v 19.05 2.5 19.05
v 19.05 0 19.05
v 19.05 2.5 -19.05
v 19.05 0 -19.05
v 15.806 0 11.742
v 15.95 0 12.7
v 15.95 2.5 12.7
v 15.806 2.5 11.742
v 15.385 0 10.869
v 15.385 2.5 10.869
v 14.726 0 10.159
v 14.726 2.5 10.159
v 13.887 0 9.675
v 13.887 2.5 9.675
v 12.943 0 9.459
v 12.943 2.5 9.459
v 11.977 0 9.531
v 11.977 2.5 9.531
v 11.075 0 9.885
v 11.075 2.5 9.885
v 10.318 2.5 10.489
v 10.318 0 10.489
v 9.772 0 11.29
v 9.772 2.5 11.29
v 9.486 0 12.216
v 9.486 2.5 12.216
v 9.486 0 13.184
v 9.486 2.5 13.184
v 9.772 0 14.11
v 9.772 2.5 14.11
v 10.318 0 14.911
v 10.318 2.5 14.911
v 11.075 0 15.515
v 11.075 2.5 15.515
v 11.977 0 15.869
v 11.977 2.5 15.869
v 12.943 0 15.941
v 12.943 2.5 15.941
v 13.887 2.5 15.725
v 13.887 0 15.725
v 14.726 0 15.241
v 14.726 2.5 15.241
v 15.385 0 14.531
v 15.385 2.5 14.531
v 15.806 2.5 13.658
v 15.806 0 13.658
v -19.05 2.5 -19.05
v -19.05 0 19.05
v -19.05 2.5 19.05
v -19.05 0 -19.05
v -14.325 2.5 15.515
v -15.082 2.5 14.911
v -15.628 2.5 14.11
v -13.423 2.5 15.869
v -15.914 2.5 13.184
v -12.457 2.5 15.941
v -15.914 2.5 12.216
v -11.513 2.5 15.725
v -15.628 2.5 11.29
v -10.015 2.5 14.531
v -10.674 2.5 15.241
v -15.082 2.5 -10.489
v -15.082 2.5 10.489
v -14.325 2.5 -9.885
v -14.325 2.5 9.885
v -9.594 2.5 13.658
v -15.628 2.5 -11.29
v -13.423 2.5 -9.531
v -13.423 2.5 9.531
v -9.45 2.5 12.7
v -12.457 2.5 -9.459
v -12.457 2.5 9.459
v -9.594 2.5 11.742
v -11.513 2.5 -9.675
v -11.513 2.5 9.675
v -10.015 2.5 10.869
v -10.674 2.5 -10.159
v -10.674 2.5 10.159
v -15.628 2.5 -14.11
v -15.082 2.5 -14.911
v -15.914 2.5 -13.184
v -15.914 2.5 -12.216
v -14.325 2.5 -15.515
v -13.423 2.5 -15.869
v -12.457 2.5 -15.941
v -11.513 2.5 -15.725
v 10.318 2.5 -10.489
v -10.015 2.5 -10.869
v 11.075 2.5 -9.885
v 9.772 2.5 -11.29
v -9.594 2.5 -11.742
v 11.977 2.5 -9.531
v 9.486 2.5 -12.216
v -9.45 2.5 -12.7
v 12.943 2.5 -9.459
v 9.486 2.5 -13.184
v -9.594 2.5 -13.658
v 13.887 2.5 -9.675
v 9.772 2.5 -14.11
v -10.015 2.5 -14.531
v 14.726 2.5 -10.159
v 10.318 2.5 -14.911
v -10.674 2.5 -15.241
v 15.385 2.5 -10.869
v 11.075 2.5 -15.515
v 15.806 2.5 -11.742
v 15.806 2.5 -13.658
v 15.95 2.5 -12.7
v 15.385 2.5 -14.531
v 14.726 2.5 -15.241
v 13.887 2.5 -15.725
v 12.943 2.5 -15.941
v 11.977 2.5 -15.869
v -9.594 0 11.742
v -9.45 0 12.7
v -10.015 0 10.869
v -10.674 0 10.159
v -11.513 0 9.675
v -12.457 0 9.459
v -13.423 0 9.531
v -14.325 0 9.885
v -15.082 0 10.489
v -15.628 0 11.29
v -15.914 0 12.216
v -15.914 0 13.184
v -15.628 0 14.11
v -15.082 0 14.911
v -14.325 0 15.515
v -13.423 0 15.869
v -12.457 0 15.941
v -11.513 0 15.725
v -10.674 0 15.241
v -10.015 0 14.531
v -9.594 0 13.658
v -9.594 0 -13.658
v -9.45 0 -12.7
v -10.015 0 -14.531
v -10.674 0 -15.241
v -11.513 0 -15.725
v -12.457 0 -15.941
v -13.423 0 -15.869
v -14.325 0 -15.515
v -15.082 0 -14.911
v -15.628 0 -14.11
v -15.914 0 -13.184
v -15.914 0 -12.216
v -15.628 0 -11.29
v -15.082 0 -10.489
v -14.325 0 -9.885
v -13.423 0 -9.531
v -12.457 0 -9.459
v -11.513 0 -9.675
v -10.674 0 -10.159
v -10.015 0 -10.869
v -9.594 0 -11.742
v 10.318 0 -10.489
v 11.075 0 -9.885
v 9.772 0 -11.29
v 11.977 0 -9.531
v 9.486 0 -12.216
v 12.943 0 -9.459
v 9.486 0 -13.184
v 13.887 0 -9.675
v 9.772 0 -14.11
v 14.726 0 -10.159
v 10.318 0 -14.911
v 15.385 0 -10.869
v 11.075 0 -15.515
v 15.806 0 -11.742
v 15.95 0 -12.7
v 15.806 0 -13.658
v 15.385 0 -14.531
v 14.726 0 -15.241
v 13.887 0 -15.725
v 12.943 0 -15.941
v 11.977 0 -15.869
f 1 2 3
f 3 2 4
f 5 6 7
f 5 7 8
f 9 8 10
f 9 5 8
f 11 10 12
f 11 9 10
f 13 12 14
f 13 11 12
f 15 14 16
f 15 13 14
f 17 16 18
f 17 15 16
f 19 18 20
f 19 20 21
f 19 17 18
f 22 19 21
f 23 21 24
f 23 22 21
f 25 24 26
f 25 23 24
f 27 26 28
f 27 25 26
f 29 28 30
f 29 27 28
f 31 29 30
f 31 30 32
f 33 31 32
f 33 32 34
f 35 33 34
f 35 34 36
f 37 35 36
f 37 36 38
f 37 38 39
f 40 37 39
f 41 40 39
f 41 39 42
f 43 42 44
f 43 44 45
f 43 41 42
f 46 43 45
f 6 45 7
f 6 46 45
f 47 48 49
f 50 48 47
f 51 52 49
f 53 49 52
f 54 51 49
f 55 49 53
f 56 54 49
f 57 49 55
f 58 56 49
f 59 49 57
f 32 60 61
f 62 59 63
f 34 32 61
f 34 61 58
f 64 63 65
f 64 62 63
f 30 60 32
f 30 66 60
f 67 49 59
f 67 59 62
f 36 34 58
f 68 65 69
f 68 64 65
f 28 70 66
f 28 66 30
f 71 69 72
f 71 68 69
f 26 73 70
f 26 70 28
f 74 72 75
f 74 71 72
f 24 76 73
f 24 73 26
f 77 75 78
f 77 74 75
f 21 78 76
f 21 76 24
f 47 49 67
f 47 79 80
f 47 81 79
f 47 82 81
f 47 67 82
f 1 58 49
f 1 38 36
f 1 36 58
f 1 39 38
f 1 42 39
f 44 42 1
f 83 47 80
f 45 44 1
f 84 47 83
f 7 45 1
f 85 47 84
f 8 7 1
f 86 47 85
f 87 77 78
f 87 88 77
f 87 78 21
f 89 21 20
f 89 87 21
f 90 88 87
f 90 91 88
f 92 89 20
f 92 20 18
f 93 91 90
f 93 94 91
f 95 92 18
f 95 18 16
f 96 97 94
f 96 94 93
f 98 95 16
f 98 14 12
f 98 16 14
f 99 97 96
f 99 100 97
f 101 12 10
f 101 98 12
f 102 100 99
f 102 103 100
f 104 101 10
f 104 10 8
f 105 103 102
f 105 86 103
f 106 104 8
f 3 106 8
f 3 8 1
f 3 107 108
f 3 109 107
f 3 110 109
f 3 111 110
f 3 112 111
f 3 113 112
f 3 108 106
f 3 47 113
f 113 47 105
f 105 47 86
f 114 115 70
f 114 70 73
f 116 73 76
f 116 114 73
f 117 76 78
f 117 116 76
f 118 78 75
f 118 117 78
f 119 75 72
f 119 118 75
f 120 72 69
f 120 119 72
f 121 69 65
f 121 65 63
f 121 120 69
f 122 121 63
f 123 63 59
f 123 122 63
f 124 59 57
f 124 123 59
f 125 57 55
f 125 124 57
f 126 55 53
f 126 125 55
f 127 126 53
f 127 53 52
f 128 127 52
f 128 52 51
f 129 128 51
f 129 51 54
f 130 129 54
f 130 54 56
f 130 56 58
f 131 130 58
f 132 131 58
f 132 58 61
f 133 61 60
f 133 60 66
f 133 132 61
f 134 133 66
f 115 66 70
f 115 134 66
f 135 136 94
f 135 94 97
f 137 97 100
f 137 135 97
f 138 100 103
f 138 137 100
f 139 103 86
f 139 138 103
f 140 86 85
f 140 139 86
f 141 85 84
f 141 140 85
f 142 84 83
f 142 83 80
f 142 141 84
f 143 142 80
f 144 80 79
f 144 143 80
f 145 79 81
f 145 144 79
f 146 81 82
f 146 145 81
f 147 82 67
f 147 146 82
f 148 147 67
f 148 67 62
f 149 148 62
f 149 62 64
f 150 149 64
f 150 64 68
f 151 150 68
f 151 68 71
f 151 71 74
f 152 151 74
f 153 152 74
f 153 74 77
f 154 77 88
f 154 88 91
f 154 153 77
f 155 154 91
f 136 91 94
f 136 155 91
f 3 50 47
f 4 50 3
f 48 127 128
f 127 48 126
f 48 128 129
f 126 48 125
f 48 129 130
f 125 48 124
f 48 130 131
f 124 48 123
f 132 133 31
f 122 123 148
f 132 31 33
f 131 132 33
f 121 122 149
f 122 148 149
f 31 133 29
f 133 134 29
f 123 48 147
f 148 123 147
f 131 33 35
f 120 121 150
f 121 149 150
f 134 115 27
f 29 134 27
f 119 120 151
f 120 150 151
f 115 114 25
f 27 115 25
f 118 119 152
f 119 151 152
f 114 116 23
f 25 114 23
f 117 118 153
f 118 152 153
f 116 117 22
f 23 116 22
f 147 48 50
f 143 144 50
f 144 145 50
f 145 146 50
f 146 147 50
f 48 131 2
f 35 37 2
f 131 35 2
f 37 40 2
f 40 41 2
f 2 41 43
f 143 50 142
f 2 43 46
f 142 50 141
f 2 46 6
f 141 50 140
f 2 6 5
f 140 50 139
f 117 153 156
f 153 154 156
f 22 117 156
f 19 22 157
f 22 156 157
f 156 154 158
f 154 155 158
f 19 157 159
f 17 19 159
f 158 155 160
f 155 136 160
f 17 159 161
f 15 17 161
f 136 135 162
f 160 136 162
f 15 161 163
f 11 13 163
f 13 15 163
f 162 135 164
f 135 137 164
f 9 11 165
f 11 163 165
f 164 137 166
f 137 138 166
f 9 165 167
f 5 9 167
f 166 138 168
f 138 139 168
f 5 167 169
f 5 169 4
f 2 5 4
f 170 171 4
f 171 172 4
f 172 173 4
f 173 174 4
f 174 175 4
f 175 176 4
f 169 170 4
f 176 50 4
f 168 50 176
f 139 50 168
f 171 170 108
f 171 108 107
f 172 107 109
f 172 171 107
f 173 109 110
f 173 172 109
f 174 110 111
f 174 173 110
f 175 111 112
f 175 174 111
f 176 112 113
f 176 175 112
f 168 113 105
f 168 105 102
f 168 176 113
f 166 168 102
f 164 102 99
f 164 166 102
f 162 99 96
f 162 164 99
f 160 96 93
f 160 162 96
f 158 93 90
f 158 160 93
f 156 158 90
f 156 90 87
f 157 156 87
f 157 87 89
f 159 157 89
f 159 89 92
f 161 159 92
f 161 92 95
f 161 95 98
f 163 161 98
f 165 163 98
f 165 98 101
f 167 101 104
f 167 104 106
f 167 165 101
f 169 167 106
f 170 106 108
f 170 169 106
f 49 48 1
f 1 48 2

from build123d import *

# Parameters (mm, degrees)
SKETCH1_W           = 38.1
SKETCH1_H           = 38.1
SKETCH1_R           = 3.25
BOSS_EXTRUDE1_DEPTH = 2.5


with BuildPart() as part:
    # Sketch1 → Boss-Extrude1 (new body)
    with BuildSketch(Plane(origin=(0, 0, 0), x_dir=(1, 0, 0), z_dir=(0, 1, 0))):
        Rectangle(SKETCH1_W, SKETCH1_H)
        with Locations((-12.7, 12.7)):
            Circle(SKETCH1_R, mode=Mode.SUBTRACT)
        with Locations((12.7, 12.7)):
            Circle(SKETCH1_R, mode=Mode.SUBTRACT)
        with Locations((-12.7, -12.7)):
            Circle(SKETCH1_R, mode=Mode.SUBTRACT)
        with Locations((12.7, -12.7)):
            Circle(SKETCH1_R, mode=Mode.SUBTRACT)
    extrude(amount=BOSS_EXTRUDE1_DEPTH)


solid = part.part
